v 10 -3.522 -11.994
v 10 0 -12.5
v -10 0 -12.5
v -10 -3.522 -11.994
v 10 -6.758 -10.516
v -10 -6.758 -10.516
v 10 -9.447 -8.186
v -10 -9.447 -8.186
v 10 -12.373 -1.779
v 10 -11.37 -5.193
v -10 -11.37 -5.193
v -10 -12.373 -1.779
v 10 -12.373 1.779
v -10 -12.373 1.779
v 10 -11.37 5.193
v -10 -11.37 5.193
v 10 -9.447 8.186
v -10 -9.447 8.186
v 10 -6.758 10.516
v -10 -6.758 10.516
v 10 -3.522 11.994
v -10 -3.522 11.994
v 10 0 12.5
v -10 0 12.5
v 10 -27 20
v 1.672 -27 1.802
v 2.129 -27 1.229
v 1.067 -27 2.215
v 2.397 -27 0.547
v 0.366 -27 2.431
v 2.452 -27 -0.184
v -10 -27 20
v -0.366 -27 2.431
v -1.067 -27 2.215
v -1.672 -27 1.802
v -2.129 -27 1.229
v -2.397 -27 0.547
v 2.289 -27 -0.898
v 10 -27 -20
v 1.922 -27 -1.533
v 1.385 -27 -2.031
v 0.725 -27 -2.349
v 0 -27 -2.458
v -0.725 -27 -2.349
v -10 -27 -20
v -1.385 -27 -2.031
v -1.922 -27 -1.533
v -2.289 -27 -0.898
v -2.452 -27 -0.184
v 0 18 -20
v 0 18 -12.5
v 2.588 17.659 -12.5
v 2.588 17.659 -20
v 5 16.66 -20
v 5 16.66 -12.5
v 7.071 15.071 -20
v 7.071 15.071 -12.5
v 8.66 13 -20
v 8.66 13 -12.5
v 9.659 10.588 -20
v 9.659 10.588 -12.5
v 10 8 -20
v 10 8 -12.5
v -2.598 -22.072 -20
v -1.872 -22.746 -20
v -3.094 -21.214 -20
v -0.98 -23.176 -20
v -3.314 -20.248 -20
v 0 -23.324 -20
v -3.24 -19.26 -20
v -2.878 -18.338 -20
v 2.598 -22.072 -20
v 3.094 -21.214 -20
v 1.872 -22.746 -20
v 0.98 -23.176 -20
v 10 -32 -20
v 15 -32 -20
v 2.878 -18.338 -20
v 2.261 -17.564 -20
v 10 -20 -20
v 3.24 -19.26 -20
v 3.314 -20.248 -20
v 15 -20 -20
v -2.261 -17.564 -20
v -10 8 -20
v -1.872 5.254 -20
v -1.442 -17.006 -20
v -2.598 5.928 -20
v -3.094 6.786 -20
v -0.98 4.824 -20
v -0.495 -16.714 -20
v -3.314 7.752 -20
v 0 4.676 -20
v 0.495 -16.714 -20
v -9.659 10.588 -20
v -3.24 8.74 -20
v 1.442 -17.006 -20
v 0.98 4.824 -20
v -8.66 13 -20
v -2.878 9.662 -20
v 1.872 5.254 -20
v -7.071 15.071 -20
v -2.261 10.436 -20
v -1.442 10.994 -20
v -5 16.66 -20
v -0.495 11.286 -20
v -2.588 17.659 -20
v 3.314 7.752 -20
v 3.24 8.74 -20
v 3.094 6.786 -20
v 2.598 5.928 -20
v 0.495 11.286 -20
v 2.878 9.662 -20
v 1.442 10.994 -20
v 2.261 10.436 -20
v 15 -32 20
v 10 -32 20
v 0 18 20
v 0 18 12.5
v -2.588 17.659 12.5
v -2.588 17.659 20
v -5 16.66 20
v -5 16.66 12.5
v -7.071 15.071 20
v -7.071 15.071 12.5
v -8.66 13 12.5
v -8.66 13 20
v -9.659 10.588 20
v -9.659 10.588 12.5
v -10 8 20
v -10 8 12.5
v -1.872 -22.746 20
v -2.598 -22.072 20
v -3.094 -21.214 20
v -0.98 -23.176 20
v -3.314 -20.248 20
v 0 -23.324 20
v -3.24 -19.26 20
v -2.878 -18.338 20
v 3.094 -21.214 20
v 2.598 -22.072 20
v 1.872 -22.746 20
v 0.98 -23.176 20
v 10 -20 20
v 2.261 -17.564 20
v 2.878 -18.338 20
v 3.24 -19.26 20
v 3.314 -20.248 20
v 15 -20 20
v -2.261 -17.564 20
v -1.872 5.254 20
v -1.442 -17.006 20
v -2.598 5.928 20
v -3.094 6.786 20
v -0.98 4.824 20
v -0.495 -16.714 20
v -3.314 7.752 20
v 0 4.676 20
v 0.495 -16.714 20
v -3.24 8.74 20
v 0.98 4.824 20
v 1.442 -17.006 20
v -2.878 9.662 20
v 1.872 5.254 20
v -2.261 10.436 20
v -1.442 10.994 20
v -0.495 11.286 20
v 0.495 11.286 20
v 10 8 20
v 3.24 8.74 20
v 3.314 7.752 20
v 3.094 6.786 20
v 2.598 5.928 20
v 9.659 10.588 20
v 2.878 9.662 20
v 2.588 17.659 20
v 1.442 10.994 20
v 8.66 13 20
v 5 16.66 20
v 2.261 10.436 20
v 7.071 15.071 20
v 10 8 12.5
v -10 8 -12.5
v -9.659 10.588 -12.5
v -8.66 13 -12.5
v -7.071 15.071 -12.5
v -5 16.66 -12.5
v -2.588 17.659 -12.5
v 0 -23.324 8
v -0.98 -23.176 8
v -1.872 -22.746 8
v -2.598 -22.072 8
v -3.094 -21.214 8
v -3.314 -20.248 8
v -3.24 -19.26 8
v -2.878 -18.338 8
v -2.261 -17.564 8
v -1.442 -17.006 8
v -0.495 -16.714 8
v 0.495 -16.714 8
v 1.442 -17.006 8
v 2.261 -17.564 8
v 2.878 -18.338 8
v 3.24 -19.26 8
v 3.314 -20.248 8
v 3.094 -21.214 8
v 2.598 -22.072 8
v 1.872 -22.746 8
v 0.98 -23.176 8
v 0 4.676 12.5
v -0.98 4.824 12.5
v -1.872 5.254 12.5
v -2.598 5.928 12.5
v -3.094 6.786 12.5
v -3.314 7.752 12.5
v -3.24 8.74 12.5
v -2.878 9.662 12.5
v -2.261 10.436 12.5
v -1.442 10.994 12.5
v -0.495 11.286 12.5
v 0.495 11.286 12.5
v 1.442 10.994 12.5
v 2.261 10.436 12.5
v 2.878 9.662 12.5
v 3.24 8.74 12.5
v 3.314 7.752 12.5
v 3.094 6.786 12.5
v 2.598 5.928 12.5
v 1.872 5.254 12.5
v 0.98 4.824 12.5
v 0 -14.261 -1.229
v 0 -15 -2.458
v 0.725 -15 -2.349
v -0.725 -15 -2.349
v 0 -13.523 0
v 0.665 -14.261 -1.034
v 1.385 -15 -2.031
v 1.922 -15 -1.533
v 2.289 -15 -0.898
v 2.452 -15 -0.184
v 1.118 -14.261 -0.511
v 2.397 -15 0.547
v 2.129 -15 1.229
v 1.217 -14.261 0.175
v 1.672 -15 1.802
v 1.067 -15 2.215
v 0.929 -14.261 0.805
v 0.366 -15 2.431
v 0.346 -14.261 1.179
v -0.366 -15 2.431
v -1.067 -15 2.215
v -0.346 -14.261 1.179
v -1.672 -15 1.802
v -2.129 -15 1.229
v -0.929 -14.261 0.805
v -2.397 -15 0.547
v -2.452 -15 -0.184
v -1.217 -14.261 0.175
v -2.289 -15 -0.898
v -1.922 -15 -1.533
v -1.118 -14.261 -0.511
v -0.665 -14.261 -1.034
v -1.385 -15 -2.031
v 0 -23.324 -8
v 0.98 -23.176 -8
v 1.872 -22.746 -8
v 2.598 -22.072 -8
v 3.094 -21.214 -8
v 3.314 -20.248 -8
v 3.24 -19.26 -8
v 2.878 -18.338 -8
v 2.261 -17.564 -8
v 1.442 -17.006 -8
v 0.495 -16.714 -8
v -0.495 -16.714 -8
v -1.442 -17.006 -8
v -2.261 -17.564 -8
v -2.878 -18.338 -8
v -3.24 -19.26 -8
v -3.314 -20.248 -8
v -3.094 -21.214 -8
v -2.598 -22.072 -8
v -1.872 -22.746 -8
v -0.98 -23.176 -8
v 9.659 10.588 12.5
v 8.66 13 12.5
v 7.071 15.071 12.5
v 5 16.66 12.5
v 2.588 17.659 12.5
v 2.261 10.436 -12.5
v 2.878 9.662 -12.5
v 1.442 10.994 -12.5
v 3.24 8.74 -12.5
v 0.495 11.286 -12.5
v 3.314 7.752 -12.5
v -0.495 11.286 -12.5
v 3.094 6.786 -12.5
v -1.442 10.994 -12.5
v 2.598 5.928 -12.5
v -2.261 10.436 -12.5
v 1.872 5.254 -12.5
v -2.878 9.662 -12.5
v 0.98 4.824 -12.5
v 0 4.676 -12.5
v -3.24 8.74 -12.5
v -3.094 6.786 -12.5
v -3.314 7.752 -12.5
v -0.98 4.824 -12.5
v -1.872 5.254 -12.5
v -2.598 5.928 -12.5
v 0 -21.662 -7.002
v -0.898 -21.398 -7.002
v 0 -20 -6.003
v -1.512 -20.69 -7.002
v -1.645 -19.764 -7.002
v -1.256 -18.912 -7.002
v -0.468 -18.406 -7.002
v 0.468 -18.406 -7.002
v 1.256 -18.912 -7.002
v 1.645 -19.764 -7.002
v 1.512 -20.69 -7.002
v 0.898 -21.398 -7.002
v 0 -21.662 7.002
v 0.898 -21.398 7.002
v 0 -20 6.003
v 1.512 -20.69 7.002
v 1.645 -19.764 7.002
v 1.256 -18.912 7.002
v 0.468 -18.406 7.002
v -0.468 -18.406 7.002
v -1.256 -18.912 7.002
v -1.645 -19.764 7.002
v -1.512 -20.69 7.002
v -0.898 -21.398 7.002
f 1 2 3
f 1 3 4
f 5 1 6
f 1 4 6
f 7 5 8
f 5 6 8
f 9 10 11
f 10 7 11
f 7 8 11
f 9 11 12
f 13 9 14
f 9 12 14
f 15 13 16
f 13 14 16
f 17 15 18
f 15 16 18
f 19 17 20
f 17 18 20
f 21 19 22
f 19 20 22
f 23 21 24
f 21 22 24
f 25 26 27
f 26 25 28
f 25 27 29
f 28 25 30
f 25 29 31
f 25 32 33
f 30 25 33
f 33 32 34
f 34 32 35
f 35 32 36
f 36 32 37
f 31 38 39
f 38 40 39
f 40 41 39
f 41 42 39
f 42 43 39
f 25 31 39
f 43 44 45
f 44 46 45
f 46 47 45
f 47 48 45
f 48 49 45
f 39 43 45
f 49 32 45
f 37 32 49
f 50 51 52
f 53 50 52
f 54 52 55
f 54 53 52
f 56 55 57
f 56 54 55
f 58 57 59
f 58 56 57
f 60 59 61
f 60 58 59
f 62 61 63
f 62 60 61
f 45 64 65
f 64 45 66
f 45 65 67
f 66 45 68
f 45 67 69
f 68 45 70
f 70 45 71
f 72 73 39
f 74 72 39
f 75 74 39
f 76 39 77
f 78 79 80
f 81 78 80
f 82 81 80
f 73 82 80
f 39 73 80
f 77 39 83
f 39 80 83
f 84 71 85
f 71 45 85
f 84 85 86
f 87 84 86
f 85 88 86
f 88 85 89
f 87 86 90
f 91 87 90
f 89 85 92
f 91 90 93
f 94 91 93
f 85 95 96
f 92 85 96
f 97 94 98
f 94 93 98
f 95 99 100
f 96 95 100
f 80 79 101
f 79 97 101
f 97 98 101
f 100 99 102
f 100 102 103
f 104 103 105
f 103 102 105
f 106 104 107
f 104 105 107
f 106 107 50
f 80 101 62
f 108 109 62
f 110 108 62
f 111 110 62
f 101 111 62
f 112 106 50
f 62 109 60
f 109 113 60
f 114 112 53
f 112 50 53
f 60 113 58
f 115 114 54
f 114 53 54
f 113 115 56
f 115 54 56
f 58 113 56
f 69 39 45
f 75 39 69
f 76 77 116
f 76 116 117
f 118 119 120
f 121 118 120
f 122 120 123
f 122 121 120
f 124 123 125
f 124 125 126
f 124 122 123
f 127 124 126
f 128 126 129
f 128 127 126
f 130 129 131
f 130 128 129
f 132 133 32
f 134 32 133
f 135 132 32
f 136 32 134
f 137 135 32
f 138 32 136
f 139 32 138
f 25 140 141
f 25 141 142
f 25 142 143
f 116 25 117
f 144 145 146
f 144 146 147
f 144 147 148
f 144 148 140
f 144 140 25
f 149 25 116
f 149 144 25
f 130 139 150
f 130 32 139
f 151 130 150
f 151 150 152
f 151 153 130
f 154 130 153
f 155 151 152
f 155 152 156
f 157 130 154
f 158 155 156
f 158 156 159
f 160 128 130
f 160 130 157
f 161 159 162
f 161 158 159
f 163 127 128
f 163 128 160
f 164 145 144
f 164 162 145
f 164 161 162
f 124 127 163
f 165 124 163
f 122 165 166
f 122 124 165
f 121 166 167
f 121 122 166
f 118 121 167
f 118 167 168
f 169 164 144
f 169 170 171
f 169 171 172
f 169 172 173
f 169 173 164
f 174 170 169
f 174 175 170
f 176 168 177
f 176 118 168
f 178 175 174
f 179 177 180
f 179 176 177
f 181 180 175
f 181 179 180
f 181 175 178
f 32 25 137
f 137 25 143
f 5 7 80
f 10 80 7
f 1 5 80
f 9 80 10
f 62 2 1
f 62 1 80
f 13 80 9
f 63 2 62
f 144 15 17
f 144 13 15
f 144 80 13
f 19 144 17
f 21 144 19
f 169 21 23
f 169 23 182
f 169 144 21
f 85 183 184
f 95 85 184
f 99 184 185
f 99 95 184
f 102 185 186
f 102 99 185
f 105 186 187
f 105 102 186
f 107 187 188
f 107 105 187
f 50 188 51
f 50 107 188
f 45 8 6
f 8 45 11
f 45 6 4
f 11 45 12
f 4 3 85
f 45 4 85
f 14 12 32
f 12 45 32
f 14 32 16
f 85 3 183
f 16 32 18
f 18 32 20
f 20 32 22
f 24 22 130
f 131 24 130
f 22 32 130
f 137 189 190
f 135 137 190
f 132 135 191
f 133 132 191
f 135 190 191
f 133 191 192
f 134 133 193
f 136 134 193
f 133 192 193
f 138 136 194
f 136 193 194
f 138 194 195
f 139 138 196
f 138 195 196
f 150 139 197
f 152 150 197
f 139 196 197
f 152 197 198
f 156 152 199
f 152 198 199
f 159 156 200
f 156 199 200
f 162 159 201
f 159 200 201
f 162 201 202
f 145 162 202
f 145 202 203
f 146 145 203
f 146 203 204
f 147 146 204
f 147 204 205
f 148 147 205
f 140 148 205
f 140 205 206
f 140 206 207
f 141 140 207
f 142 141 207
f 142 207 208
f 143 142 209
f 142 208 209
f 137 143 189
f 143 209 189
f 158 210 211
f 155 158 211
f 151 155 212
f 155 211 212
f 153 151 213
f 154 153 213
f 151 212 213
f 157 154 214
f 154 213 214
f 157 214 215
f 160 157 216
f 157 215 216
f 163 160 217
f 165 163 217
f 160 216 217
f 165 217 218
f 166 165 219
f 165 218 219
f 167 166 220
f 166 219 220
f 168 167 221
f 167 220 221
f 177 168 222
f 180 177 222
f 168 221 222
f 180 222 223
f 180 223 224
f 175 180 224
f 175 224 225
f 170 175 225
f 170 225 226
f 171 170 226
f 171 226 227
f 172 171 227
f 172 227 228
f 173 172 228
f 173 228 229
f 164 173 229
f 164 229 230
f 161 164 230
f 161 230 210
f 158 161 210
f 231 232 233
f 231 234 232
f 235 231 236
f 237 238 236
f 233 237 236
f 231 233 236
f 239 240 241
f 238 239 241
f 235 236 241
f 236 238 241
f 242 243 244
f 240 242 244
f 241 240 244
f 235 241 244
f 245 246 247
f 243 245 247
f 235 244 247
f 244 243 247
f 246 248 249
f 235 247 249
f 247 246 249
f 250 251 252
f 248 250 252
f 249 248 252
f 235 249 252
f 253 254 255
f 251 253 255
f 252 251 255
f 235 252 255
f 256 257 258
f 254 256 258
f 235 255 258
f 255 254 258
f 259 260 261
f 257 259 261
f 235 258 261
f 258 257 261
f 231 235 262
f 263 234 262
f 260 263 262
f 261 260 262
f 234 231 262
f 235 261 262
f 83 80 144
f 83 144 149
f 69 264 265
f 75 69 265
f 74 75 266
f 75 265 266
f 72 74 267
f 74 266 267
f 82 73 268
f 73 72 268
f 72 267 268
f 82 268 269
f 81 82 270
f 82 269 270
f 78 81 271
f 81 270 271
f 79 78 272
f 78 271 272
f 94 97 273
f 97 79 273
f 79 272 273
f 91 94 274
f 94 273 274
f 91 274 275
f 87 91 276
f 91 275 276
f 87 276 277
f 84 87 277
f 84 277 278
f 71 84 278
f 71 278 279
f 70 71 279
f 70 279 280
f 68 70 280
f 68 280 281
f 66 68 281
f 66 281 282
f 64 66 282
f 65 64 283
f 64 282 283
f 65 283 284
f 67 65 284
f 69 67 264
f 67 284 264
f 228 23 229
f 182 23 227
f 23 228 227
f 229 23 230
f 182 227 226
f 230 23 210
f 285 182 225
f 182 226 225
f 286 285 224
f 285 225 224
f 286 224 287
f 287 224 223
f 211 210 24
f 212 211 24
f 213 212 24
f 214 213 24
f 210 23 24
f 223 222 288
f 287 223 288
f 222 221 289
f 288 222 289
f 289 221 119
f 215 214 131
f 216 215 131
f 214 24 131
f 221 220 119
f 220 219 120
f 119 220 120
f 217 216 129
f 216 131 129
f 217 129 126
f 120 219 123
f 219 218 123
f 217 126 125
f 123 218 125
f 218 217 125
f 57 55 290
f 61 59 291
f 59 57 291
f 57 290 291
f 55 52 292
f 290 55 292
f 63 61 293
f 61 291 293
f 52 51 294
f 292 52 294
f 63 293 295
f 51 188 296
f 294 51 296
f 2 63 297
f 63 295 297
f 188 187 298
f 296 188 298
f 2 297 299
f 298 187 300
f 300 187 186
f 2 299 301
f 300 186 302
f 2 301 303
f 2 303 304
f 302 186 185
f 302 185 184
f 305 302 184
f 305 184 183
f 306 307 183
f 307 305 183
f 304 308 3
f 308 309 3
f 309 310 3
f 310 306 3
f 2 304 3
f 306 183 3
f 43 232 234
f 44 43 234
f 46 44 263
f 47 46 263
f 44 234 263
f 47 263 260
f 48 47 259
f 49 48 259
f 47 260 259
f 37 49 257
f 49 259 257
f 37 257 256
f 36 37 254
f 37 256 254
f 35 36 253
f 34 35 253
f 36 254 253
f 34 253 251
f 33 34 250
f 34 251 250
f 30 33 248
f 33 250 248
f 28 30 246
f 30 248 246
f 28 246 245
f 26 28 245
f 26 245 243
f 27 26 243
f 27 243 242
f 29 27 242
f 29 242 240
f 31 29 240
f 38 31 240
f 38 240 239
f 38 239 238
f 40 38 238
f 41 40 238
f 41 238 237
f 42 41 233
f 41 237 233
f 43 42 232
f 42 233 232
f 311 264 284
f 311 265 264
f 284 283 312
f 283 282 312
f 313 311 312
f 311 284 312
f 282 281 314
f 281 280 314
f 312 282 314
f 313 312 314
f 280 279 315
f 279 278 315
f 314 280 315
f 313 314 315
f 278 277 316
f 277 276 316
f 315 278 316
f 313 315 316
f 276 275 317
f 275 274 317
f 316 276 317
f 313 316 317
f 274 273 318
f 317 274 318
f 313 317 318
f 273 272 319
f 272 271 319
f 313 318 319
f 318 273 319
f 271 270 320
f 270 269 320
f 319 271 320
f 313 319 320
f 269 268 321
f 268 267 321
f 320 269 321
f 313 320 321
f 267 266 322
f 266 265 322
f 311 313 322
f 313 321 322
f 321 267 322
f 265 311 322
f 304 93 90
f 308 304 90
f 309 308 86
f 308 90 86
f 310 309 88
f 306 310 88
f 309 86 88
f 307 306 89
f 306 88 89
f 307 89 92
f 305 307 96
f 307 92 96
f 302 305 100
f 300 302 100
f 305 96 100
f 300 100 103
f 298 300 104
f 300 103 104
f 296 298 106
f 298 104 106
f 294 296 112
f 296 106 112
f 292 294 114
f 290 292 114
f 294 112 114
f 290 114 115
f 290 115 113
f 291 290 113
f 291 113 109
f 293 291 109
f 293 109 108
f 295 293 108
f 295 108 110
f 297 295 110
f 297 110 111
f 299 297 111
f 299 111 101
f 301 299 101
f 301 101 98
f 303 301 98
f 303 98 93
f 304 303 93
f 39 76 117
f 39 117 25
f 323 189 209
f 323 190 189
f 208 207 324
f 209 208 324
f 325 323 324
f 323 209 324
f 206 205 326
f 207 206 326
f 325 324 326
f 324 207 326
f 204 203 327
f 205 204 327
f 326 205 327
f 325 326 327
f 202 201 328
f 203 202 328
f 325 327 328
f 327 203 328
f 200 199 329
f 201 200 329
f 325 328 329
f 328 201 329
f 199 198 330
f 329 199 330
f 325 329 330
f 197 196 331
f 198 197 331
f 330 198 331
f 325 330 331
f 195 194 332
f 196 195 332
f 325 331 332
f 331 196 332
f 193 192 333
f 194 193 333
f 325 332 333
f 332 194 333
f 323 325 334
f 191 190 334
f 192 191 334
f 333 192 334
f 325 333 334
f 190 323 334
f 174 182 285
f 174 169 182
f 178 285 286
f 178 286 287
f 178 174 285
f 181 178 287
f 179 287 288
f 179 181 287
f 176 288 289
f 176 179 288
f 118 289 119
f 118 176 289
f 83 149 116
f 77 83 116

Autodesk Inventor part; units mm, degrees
ref_plane "YZ Plane" through (0, 0, 0) normal (1, 0, 0) x (0, 1, 0)
ref_plane "XZ Plane" through (0, 0, 0) normal (0, 1, 0) x (-1, 0, 0)
ref_plane "XY Plane" through (0, 0, 0) normal (0, 0, 1) x (1, 0, 0)
sketch "草圖1" plane through (0, 0, 0) normal (1, 0, 0) x (0, 1, 0)
  arc A0 (0, 12.5) -> (0, -12.5) centre (0, 0) ccw
  line L0 (-27, 0) -> (-27, -20)
  line L1 (-27, -20) -> (18, -20)
  line L2 (18, 20) -> (-27, 20)
  line L3 (-27, 20) -> (-27, 0)
  line L4 (0, 12.5) -> (18, 12.5)
  line L5 (18, -12.5) -> (0, -12.5)
  line L6 (18, -12.5) -> (18, -20)
  line L7 (18, 12.5) -> (18, 20)
  dimension "d5" = 25
  dimension "d12" = 18
  dimension "d13" = 45
  dimension "d15" = 40
  dimension "d16" = 45
  dimension "d17" = 7.5
  dimension "d18" = 7.5
  dimension "d19" = 18
extrude "擠出1" add sketch "草圖1" along normal mid plane 20
sketch "草圖2" plane through (-10, -27, 20) normal (0, 0, 1) x (1, 0, 0)
  line L0 (20, 0) -> (20, 45) projected
  line L1 (20, 0) -> (20, 7)
  line L2 (20, 7) -> (25, 7)
  line L3 (25, 7) -> (25, 0)
  line L4 (25, 0) -> (25, -5)
  line L5 (25, -5) -> (20, -5)
  line L6 (0, 0) -> (20, 0) projected
  line L7 (20, -5) -> (20, 0)
  point P0 (10, 27)
  dimension "d22" = 7
  dimension "d23" = 5
  dimension "d24" = 5
extrude "擠出2" add sketch "草圖2" against normal up to surface (40 mm away)
fillet "圓角1" radius 10 4 edges at (10, 18, 16.25) (-10, 18, 16.25) (10, 18, -16.25) (-10, 18, -16.25)
sketch "草圖3" plane through (10, -32, 20) normal (0, 0, 1) x (1, 0, 0)
  line L0 (-20, 5) -> (0, 5) projected
  point P0 (-10, 32)
  point P1 (-10, 40)
  dimension "d30" = 35
hole "孔1" at (0, 8, 20) direction (0, 0, -1) diameter 6.647 end through all thread size "M8x1.25" class "6H" standard "ISO Metric profile"
sketch "草圖4" plane through (10, -32, 20) normal (0, 0, 1) x (1, 0, 0)
  line L0 (-20, 5) -> (0, 5) projected
  point P0 (-10, 32)
  point P1 (-10, 12)
  dimension "d38" = 7
hole "孔2" at (0, -20, 20) direction (0, 0, -1) diameter 6.647 depth 12 tip angle 118 thread size "M8x1.25" class "6H" standard "ISO Metric profile"
mirror "鏡射1" about plane through (0, 0, 0) normal (0, 0, 1) of "孔2"
sketch "草圖5" plane through (-10, -27, -20) normal (0, -1, 0) x (1, 0, 0)
  point P0 (10, 20)
  point P1 (10, 20)
hole "孔3" at (0, -27, 0) direction (0, 1, 0) diameter 4.917 depth 12 tip angle 118 thread size "M6x1" class "6H" standard "ISO Metric profile"
properties part number "7. 砲座"
